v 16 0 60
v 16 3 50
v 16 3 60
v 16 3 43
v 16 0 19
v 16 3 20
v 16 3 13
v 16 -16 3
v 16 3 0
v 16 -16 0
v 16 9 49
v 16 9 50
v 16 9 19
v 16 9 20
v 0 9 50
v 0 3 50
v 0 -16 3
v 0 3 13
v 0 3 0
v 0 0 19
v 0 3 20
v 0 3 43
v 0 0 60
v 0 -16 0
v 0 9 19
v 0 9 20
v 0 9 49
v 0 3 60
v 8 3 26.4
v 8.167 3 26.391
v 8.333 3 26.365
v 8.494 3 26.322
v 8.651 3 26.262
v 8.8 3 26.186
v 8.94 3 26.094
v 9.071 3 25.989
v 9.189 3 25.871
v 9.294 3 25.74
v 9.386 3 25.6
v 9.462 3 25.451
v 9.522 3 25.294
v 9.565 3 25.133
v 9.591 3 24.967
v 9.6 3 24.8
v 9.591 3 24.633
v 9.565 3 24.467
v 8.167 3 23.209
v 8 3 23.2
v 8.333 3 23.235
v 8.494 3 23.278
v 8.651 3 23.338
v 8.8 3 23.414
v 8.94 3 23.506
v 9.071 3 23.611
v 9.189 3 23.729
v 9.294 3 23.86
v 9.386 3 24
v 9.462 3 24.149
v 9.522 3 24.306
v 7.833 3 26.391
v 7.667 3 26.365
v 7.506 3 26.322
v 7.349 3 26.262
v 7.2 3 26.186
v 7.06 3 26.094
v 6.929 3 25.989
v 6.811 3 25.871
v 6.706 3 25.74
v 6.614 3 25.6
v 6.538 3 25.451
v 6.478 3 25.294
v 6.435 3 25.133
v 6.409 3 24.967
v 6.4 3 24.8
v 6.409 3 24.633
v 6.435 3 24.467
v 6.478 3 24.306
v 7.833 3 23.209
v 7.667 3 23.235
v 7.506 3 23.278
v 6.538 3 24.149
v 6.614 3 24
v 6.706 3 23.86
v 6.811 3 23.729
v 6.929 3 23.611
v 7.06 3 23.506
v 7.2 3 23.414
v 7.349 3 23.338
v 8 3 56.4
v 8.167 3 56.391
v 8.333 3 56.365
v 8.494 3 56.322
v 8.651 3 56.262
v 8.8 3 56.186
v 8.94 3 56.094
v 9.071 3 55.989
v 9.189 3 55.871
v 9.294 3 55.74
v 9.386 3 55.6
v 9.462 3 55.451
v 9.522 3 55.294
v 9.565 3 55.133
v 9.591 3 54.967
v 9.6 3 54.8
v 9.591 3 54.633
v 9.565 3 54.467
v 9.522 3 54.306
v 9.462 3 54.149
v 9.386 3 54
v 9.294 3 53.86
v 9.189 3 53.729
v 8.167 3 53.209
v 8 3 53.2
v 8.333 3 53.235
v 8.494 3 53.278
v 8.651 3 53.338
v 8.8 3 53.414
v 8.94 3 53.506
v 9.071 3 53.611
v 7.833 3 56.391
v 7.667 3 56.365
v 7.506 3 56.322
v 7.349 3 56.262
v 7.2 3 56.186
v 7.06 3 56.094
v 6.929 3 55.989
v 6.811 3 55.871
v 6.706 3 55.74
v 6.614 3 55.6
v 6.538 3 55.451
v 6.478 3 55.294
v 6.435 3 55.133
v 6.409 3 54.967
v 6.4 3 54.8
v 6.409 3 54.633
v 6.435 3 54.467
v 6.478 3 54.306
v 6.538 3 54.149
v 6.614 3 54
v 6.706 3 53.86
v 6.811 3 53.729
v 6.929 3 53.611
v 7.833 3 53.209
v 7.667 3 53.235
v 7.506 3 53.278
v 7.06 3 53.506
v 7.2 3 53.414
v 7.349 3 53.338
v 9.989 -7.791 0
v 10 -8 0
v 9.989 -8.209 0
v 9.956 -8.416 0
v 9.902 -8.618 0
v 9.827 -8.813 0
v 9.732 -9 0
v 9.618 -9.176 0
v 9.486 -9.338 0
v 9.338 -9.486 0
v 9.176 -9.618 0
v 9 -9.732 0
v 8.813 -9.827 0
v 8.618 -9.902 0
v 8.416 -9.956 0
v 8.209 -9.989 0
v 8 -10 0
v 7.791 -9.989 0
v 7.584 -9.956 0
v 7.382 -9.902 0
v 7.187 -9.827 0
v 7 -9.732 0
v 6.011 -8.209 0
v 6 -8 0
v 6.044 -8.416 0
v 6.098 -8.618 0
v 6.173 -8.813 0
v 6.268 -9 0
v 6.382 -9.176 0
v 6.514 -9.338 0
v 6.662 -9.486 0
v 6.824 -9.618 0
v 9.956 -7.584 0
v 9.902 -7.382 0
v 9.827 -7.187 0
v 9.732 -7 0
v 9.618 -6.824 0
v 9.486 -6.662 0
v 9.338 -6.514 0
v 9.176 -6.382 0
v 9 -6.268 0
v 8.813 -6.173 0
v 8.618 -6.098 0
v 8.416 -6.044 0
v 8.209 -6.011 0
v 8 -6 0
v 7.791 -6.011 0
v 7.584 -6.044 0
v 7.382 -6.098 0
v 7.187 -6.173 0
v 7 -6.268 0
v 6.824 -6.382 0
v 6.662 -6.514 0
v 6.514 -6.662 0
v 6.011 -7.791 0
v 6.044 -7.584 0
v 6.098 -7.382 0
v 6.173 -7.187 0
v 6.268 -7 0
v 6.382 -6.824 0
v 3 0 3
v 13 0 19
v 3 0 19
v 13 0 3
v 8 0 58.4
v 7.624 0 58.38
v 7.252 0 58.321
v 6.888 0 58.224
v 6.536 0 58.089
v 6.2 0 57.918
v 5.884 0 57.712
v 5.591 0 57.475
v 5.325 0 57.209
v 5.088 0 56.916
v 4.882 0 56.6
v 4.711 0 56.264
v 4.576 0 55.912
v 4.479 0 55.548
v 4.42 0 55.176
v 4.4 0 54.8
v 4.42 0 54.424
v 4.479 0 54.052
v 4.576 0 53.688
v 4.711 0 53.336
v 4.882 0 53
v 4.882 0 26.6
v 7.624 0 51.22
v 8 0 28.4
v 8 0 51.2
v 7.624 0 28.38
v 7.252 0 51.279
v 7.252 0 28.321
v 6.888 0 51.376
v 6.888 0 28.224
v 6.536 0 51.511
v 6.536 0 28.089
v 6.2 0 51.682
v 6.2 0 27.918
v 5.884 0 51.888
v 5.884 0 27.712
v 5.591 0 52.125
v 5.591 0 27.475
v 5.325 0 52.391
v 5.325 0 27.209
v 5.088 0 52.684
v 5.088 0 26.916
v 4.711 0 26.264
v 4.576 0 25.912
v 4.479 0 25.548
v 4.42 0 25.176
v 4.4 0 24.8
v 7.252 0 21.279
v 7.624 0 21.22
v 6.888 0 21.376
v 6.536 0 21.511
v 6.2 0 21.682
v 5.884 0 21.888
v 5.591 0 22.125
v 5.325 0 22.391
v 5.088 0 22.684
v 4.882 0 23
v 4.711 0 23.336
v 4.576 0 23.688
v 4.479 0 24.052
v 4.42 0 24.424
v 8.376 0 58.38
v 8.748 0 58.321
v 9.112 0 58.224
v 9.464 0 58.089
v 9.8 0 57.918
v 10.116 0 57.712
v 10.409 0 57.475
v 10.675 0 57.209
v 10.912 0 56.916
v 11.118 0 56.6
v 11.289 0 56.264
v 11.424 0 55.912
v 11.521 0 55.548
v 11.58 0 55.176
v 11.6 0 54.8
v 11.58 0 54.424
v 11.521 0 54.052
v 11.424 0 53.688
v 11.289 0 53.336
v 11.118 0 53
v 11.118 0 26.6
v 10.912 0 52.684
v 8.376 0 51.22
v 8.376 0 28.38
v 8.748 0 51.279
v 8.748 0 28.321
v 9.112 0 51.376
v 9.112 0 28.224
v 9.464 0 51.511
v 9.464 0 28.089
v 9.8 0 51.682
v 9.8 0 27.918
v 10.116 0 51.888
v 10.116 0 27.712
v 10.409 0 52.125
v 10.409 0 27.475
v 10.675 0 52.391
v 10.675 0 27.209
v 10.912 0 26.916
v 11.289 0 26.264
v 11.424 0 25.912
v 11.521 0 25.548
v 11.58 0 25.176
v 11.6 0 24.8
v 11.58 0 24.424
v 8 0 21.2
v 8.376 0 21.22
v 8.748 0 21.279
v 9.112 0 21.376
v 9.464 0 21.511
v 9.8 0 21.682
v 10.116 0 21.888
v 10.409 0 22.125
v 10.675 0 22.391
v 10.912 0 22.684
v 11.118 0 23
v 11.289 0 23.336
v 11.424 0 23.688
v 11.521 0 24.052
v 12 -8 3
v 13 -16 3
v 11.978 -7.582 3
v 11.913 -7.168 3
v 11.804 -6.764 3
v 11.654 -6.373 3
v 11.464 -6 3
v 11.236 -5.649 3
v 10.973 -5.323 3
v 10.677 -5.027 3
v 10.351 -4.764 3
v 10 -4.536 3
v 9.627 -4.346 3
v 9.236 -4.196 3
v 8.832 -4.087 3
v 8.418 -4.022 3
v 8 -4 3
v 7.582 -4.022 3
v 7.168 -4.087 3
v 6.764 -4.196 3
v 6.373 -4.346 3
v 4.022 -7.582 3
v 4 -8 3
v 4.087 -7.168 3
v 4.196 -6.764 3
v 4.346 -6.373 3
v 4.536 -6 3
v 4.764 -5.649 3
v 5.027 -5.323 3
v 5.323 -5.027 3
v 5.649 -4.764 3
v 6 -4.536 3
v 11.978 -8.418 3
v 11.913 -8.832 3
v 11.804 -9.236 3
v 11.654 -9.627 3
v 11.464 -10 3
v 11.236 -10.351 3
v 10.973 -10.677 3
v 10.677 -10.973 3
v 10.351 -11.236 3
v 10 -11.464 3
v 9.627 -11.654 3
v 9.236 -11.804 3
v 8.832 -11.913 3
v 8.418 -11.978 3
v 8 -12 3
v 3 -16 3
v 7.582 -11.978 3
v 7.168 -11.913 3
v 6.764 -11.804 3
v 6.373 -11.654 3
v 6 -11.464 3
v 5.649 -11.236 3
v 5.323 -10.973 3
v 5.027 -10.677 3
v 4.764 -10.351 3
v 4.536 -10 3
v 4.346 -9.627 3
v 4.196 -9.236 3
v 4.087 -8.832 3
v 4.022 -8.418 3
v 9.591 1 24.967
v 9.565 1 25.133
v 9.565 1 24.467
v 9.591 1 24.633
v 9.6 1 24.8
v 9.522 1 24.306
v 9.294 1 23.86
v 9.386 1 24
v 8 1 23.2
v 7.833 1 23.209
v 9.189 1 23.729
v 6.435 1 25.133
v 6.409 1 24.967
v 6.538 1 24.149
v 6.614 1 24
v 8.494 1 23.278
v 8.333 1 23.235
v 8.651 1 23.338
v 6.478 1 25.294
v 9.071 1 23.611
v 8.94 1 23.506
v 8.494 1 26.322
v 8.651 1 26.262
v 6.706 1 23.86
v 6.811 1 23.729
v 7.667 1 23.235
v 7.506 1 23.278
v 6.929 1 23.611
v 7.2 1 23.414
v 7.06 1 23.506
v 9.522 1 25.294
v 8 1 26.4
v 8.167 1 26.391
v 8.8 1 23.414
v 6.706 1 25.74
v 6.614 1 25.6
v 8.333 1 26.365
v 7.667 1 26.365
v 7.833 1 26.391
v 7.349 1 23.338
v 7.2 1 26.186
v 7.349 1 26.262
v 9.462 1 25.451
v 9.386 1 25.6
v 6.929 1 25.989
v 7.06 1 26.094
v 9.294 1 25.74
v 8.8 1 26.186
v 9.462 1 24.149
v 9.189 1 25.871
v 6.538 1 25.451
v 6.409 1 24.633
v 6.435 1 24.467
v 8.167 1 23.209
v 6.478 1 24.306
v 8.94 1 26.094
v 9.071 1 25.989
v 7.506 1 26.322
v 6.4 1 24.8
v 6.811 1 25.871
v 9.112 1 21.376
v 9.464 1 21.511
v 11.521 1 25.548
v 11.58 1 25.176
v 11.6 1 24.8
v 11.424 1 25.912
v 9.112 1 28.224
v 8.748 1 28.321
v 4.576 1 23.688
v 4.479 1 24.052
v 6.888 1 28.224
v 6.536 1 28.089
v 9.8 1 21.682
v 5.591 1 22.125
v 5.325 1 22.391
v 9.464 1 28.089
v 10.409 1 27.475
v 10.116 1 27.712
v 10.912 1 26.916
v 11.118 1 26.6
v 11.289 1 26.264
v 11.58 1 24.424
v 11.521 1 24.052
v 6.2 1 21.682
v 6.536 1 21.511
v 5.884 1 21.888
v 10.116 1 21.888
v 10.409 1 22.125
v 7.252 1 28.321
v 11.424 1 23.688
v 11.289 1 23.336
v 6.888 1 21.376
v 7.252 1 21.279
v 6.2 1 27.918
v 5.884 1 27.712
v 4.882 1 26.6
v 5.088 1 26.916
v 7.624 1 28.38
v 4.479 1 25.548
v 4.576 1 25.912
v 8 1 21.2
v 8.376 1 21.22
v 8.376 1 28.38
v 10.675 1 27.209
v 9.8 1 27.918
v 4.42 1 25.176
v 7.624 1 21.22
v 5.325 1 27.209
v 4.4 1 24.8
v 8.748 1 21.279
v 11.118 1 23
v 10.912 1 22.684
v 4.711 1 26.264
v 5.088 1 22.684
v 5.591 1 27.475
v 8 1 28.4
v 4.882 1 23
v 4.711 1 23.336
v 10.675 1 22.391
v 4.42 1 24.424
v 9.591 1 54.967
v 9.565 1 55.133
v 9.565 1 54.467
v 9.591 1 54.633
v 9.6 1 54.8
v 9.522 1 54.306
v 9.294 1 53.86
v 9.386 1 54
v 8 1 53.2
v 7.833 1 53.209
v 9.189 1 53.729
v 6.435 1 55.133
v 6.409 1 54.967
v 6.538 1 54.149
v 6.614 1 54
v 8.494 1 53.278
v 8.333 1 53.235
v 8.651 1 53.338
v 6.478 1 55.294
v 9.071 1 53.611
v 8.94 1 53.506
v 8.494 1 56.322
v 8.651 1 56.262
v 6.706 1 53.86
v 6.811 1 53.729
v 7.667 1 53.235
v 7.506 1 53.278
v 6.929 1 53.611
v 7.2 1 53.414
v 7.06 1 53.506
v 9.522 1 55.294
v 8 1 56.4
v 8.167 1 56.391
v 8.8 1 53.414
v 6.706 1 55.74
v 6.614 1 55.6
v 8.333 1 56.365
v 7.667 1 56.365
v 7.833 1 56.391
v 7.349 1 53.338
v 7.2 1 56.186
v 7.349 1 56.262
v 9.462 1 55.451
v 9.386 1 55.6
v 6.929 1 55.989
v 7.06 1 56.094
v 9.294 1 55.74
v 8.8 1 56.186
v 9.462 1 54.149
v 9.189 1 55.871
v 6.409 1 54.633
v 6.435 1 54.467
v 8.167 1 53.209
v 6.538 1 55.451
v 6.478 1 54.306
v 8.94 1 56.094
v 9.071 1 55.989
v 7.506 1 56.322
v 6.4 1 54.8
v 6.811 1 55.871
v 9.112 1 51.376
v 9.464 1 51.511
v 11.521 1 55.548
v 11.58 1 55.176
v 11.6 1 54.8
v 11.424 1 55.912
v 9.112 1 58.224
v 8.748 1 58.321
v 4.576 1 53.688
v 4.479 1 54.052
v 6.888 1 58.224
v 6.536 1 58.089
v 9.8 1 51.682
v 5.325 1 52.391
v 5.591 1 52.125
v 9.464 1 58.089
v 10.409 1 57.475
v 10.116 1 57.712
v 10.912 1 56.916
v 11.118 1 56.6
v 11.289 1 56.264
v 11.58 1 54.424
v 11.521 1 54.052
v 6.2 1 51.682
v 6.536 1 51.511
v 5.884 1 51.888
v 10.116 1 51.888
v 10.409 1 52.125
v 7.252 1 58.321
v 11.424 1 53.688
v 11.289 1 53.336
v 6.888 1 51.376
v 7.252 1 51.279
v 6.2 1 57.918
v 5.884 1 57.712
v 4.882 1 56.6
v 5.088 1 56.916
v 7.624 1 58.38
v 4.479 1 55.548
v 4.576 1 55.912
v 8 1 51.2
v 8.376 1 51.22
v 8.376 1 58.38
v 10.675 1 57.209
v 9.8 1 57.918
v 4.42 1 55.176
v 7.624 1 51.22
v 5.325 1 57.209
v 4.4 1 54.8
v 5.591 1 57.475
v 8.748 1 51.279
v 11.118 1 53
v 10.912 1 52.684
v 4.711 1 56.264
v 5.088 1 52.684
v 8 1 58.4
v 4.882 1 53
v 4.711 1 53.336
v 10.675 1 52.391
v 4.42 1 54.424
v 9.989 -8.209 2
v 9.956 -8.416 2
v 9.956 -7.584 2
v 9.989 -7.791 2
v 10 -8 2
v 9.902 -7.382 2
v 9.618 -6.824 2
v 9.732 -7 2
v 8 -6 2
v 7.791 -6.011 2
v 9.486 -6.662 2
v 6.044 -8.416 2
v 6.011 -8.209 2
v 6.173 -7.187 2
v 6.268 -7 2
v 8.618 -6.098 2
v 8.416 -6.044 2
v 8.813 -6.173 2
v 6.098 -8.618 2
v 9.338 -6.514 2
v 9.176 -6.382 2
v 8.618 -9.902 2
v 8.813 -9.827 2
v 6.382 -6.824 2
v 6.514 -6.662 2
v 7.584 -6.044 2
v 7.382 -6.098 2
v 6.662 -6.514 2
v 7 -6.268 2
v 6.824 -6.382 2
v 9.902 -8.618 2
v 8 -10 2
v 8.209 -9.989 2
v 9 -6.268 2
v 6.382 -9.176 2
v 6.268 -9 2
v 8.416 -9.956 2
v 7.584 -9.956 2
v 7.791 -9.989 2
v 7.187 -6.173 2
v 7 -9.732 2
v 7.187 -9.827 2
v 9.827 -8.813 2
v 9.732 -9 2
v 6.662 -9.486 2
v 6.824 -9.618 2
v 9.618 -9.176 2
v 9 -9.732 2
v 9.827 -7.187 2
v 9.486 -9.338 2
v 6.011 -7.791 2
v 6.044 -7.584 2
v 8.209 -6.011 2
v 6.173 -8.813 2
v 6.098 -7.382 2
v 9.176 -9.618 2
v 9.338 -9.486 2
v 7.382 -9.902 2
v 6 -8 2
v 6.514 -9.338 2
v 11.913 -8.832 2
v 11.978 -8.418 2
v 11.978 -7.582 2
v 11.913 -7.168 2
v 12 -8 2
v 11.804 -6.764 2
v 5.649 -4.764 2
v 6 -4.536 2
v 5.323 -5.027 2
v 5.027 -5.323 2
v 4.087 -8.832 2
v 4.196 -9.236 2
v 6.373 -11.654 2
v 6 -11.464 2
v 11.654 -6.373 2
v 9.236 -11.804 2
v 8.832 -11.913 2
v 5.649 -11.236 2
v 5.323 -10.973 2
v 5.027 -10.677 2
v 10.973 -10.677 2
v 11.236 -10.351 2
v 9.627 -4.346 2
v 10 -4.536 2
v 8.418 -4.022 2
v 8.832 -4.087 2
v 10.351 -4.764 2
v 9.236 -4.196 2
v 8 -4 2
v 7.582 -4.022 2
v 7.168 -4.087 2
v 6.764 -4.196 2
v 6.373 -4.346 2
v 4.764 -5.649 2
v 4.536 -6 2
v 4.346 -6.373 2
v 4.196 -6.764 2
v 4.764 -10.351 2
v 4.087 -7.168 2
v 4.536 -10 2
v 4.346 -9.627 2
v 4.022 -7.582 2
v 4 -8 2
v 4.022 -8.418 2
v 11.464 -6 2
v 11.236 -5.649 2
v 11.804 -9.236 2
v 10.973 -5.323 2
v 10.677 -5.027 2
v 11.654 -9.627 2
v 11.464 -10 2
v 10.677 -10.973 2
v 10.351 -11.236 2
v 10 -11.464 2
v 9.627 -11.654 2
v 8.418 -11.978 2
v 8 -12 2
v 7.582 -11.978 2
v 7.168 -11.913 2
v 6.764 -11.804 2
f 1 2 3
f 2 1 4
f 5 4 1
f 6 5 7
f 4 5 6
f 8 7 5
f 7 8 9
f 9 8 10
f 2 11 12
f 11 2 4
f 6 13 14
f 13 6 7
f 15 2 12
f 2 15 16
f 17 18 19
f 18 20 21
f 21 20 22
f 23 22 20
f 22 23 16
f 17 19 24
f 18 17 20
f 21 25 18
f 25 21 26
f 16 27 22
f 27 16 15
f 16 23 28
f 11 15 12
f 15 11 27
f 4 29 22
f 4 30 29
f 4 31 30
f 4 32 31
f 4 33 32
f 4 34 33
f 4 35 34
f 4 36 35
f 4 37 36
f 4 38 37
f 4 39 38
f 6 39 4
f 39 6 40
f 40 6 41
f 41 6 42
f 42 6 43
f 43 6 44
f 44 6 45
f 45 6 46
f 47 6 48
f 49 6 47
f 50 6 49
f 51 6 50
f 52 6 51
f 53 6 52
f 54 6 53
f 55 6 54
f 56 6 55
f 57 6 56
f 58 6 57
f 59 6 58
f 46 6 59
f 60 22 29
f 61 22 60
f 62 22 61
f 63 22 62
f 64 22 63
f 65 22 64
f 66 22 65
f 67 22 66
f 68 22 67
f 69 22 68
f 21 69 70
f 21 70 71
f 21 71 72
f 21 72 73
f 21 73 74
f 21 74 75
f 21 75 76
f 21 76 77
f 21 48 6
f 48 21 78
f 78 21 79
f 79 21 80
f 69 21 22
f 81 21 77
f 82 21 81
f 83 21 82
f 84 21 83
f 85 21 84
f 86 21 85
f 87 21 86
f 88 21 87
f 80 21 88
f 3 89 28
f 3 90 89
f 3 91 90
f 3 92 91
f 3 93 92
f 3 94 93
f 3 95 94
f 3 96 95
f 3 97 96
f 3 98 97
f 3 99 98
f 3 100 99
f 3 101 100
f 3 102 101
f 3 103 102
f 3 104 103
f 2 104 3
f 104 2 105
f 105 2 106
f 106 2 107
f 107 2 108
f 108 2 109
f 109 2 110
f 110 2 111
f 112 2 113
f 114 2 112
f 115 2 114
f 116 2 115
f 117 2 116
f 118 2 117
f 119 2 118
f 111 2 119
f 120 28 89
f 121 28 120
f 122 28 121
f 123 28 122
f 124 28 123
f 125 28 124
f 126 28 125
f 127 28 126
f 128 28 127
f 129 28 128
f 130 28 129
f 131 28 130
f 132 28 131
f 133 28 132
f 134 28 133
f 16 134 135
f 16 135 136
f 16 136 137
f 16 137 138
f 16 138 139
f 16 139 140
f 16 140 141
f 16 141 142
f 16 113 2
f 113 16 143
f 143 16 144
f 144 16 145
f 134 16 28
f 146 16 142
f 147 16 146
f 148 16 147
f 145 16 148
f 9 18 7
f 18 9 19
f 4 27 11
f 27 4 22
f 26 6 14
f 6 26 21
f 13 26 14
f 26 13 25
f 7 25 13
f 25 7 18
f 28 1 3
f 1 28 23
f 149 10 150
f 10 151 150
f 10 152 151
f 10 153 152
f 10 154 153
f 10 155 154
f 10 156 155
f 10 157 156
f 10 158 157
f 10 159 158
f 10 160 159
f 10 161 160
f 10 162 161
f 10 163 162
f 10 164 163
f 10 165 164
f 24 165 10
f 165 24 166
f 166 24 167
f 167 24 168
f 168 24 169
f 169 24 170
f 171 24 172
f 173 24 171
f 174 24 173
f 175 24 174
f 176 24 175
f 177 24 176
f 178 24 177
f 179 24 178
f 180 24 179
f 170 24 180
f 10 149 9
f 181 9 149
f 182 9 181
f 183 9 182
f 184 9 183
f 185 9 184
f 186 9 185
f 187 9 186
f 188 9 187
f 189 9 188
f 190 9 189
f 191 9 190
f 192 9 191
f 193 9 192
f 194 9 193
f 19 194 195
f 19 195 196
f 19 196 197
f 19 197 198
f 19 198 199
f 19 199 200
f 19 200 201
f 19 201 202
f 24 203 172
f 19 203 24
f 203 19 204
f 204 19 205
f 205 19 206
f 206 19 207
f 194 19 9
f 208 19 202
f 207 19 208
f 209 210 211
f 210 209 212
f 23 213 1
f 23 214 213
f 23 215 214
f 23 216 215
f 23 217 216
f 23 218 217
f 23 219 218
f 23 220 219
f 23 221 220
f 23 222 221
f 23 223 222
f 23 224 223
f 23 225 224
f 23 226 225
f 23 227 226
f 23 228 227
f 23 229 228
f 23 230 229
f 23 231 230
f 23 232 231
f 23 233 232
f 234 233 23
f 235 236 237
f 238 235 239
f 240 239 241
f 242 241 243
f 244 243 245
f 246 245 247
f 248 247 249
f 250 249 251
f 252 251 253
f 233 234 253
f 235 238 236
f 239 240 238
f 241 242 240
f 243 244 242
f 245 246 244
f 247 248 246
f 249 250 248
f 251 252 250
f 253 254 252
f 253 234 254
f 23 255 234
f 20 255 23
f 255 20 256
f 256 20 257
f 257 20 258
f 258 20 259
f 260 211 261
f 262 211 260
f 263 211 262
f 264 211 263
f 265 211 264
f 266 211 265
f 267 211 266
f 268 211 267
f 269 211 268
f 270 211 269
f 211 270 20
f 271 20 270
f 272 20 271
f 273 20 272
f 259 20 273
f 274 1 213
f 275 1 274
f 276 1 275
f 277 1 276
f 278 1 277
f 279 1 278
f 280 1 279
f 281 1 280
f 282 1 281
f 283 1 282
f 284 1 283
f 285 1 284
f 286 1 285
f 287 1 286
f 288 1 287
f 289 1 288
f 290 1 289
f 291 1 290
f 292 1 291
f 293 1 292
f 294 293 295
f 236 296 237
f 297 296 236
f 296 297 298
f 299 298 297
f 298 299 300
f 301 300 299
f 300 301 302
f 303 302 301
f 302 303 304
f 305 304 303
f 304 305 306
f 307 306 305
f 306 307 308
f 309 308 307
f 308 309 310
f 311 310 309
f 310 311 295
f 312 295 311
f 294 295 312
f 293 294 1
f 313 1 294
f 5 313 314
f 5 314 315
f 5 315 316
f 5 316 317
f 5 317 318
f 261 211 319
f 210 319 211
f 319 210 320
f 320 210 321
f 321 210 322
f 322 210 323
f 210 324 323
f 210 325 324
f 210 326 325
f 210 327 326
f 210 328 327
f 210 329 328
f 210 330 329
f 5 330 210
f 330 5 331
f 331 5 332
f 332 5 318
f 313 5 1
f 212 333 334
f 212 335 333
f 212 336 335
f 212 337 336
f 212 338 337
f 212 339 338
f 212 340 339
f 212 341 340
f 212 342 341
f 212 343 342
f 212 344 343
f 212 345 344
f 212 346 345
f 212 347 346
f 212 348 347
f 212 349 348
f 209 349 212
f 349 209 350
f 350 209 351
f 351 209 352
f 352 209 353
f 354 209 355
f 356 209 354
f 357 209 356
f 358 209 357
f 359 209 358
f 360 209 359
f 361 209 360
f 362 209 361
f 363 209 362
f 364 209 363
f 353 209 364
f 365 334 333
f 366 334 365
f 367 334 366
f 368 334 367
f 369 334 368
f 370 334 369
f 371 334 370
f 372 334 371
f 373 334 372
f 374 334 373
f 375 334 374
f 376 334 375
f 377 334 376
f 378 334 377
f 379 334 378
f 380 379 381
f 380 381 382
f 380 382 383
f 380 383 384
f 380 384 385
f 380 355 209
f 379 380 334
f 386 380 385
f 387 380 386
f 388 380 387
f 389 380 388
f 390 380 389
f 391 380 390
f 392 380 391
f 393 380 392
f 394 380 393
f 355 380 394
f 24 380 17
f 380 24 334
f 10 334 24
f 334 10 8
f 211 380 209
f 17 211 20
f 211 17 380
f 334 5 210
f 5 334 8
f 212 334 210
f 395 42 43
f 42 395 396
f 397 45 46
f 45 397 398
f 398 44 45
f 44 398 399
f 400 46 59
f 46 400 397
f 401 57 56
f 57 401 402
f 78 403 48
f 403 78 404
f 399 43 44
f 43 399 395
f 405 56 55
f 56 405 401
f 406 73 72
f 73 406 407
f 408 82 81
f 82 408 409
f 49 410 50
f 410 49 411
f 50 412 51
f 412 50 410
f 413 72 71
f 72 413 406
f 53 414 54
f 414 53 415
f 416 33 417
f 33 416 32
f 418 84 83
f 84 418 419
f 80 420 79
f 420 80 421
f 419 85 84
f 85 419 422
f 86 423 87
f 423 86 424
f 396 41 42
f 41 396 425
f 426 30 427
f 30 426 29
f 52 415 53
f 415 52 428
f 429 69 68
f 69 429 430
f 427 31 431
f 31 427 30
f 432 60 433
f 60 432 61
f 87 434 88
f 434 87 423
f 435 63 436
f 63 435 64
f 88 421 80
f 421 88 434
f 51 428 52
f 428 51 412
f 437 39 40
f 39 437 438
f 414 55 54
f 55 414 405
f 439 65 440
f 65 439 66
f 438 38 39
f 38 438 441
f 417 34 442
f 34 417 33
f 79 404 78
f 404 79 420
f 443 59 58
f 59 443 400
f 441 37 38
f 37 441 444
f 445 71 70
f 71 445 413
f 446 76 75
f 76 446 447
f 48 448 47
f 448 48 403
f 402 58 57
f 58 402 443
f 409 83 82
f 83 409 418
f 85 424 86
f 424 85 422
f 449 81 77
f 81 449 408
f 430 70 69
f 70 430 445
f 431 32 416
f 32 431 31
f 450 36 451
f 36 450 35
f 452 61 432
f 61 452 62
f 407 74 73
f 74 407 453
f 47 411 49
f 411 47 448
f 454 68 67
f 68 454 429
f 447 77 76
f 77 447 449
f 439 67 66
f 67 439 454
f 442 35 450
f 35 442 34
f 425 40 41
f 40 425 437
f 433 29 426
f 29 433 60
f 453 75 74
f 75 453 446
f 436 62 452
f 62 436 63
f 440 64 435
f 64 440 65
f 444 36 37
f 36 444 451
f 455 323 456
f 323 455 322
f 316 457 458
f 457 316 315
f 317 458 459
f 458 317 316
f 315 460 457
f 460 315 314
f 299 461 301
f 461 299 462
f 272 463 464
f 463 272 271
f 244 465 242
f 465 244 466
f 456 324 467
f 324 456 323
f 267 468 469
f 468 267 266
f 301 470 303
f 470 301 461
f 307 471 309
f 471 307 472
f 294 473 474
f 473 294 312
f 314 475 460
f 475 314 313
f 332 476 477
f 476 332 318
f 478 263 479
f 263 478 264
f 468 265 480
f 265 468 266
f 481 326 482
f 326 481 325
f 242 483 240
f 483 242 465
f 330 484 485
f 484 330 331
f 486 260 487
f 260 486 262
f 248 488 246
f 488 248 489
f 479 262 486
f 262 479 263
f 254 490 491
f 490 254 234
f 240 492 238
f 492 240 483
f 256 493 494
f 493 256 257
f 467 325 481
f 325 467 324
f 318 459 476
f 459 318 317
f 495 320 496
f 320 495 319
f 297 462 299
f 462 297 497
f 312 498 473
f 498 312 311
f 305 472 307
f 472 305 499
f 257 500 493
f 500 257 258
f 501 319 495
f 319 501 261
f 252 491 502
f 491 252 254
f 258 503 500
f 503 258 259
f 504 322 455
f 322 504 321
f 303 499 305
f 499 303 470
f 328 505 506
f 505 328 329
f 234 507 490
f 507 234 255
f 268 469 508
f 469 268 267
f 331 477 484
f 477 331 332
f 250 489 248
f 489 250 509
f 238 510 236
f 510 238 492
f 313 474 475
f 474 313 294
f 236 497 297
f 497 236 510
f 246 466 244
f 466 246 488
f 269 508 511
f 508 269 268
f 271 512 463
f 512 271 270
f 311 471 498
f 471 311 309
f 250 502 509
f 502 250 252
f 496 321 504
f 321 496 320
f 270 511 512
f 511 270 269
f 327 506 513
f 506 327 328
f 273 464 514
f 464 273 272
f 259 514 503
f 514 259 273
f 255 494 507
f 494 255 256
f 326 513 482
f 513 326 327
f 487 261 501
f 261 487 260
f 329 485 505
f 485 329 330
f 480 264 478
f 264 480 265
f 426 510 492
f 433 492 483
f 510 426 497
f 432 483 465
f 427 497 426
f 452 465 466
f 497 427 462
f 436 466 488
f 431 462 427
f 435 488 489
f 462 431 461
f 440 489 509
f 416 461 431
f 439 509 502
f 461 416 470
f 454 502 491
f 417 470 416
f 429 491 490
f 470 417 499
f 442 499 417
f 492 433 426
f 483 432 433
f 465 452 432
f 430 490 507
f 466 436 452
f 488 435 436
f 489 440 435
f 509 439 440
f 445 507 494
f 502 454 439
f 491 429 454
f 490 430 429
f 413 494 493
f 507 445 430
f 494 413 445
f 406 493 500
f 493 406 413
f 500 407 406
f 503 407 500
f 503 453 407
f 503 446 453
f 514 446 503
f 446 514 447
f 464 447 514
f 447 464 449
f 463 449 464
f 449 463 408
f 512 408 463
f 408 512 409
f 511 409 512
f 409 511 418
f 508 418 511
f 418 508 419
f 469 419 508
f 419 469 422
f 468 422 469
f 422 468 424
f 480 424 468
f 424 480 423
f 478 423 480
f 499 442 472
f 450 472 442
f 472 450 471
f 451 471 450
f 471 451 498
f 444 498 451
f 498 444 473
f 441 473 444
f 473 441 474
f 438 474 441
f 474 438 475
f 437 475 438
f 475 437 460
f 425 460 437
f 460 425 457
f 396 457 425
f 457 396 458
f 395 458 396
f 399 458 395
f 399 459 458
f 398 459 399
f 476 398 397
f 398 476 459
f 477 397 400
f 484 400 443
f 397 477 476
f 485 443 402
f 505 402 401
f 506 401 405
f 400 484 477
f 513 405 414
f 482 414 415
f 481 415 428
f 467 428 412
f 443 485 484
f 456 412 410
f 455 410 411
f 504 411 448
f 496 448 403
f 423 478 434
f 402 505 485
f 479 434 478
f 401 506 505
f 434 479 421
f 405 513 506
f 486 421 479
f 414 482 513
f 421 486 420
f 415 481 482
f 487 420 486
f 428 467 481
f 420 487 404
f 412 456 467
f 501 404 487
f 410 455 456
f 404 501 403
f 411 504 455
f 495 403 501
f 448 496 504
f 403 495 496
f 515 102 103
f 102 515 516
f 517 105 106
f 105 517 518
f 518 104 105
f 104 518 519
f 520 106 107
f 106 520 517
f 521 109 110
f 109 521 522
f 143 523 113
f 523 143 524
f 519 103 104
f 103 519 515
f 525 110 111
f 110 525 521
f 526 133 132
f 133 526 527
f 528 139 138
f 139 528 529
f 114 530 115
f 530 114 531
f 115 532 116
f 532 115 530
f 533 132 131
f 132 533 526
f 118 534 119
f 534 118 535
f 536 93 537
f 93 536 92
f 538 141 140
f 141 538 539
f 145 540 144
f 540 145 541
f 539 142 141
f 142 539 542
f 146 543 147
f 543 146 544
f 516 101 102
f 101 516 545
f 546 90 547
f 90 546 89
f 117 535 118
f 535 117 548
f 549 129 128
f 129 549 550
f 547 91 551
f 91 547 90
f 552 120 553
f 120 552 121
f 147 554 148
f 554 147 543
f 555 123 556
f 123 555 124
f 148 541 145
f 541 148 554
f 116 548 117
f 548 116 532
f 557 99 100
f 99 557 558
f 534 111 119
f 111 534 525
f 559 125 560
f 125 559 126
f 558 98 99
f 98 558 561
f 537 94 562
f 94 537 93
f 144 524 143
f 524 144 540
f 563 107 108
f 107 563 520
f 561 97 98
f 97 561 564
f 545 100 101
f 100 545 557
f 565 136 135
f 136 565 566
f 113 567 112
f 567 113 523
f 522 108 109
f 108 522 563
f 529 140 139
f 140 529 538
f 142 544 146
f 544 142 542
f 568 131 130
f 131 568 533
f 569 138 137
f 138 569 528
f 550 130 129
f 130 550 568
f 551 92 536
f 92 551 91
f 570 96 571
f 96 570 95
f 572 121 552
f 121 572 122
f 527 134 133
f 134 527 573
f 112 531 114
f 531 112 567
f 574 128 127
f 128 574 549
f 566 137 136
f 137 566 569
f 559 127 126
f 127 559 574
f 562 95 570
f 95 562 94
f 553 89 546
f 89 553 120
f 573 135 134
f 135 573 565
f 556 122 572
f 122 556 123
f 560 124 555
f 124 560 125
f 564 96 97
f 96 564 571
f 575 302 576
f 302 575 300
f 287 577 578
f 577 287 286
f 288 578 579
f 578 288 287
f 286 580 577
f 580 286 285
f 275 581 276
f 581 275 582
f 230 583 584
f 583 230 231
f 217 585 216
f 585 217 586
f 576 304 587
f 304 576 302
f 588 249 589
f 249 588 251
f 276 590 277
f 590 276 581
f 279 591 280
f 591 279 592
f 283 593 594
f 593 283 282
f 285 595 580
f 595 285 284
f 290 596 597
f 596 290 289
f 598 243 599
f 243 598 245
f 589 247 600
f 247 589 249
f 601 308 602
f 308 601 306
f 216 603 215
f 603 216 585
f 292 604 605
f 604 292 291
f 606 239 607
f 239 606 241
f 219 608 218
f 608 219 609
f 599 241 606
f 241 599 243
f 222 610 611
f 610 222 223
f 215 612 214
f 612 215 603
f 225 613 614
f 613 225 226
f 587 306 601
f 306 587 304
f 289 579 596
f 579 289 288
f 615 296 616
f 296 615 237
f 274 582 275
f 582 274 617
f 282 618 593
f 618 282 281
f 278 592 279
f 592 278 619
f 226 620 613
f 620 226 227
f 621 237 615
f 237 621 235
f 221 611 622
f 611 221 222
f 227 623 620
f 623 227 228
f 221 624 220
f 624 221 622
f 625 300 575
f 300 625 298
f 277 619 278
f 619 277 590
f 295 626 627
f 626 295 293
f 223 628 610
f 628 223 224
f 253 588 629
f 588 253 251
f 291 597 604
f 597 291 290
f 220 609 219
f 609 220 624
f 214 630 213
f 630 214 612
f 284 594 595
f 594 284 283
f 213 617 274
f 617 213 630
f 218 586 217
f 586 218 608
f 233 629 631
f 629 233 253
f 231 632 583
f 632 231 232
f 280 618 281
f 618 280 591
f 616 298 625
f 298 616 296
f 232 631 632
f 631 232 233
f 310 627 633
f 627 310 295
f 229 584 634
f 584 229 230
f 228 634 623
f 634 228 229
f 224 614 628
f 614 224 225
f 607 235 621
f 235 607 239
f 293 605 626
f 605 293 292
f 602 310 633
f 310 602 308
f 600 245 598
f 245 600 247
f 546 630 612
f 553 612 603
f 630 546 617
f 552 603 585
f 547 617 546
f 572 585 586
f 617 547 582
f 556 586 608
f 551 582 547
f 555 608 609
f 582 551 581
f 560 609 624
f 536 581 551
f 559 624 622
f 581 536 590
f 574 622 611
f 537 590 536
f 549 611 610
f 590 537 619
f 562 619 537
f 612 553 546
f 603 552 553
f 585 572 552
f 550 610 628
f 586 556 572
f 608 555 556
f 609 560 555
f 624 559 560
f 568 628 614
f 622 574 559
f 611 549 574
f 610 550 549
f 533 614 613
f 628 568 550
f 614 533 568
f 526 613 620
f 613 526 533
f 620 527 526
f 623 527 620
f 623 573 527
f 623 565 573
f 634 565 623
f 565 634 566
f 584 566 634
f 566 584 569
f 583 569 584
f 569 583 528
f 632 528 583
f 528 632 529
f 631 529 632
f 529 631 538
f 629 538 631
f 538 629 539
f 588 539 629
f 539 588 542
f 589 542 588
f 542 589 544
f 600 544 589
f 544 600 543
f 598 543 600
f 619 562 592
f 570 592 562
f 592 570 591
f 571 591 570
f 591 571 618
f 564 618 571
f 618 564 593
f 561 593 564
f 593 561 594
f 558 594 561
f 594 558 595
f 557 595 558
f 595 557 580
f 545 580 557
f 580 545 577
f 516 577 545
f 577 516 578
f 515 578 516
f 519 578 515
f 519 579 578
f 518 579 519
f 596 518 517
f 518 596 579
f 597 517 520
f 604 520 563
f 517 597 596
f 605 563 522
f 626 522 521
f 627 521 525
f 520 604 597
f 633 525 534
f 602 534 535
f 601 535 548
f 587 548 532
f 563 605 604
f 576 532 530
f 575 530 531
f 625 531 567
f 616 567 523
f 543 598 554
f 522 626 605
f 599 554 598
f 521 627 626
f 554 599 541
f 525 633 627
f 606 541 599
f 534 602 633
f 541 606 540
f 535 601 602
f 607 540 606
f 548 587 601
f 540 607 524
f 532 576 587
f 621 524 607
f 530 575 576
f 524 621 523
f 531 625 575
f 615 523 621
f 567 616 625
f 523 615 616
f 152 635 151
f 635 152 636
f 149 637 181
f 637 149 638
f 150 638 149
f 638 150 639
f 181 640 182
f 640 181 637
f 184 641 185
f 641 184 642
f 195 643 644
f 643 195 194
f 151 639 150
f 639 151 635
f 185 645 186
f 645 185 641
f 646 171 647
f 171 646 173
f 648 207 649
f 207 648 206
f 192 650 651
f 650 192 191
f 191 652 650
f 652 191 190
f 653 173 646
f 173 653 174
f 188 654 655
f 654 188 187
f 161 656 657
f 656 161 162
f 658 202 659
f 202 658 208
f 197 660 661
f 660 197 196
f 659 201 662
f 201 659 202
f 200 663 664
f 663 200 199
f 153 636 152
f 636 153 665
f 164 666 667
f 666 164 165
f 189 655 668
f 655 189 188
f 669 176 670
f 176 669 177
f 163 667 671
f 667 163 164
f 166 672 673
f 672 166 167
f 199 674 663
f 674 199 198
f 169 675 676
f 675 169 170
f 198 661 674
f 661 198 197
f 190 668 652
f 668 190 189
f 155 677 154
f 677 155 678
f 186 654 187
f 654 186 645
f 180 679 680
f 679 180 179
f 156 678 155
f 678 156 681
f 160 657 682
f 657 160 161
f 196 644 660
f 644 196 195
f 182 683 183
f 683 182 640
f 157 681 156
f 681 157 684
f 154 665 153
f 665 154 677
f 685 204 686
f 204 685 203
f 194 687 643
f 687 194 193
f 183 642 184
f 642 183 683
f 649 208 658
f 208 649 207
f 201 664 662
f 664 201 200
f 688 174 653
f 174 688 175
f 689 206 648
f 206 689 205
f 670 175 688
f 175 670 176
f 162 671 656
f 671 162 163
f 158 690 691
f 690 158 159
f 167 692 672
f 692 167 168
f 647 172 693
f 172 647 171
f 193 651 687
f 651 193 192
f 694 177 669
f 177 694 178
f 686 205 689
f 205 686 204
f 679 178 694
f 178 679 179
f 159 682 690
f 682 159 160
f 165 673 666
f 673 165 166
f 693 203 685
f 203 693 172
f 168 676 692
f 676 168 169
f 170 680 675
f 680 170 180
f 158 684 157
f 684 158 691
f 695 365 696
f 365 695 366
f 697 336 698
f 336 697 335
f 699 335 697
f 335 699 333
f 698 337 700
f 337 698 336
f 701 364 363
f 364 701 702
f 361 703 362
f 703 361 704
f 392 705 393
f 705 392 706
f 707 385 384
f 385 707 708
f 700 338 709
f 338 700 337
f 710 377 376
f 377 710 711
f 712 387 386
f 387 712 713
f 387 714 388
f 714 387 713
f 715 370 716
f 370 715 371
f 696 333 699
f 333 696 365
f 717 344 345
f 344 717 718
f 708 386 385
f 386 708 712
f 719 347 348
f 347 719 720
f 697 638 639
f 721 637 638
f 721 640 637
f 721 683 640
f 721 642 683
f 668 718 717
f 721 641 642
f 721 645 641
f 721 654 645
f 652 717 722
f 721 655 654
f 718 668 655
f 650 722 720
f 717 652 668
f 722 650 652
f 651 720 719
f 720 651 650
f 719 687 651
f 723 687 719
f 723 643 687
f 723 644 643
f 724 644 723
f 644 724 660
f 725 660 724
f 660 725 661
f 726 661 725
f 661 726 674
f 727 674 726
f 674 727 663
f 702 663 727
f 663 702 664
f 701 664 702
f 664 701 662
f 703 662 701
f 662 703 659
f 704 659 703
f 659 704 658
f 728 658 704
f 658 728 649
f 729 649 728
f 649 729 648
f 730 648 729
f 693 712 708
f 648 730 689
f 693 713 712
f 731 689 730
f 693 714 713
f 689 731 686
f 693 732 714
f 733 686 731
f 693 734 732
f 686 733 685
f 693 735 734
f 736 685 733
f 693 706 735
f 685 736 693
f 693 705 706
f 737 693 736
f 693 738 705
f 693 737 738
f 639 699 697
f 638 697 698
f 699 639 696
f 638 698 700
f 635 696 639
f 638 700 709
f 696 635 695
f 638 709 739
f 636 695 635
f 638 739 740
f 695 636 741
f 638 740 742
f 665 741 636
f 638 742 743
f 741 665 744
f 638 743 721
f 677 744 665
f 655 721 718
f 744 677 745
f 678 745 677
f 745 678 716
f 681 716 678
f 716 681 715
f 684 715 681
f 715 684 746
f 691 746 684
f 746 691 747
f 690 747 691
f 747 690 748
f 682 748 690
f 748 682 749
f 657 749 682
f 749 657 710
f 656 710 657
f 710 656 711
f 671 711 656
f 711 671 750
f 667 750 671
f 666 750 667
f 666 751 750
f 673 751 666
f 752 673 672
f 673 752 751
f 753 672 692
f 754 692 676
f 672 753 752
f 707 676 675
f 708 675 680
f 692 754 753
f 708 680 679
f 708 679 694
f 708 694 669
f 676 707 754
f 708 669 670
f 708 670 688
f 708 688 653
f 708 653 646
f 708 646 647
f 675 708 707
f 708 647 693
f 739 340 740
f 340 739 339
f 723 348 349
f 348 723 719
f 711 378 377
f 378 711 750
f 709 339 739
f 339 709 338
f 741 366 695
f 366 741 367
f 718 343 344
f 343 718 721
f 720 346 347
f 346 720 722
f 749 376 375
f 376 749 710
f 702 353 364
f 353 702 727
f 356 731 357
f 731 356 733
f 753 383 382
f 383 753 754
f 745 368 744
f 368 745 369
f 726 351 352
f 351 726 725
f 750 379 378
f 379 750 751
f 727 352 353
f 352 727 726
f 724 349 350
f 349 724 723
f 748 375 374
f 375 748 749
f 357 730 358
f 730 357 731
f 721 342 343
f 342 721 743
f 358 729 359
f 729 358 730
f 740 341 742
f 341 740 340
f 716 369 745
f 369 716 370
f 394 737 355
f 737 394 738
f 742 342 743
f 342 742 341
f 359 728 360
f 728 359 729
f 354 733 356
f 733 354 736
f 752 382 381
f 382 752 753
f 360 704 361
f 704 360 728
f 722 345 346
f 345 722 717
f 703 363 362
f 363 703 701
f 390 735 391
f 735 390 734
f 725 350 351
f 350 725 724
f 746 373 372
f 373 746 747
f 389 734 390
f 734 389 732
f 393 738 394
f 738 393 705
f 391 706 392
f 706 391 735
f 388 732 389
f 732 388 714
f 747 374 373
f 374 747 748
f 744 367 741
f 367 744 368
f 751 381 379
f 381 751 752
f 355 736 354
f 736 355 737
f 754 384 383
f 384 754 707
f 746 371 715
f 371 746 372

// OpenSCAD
// 3D-printed 3.5" drive mount posts

// Idea is to print 4 of these; they hold two drives
// securely, allow front access (e.g., for inserting
// media), and can be screwed down. M3 screws are
// assumed for securing the drives. 6-32 screws are
// assumed for screwing the posts to whatever surface
// the posts are attached to.

$fn = 60;

// ----------------------------------------------------------------------
// design parameters (all units are mm)
// ----------------------------------------------------------------------

// main post dimensions
post_h = 60;
post_w = 16;
post_d = 3;

// how deep the foot extends back from the "front" of the post
foot_d = post_w;

brace_side_len = foot_d;

// how far below center of drive screw hole the top surface
// of the support ledge should be
ledge_offset_h = 4.8;

// ledge depth
ledge_d = 6;

// thickness of ledge above the bevel (so there isn't a sharp edge)
ledge_h = 1;

// drive placement
drive_clearance_h = 20; // how far above the surface the bottom drive is placed
drive_separation_h = 30; // separation, bottom of bottom drive to bottom of top drive

bottom_drive_h = drive_clearance_h;
top_drive_h = bottom_drive_h + drive_separation_h;

// M3 screw hole diameter
m3_hole_diameter = 3.2;

// 6-32 screw hole diameter (these are a bit larger than M3)
n6_hole_diameter = 4;

// "countersink" diameter and depth (so that screw holes are recessed slightly)
m3_countersink_diameter = 7.2;
n6_countersink_diameter = 8;
countersink_d = 1;

// ----------------------------------------------------------------------
// component modules
// ----------------------------------------------------------------------

// triangular brace to help keep the post rigid with respect to the foot
module foot_brace() {
    translate([post_d, brace_side_len, 0]) {
        rotate([90, 0, 270]) {
            linear_extrude(post_d) {
                polygon([[0, 0], [brace_side_len, 0], [0, brace_side_len]]);
            }
        }
    }
}

// trangular "bevel" below the drive ledge
module ledge_bevel() {
    rotate([90, 90, 90]) {
        linear_extrude(post_w) {
            polygon([[0, 0], [ledge_d, 0], [0, ledge_d]]);
        }
    }
}

// drive "ledge"; z reference is the surface that the
// drive sits on
module ledge() {
    translate([0, 0, -ledge_h]) {
        cube([post_w, ledge_d, ledge_h]);
        ledge_bevel();
    }
}

// body of post: defines the solid shapes, but doesn't
// have the screw holes
module post_body() {
    // main post
    cube([post_w, post_d, post_h]);
    
    // foot
    translate([0, -foot_d, 0]) {
        cube([post_w, foot_d, post_d]);
    }
    
    // diagonal bracing for foot
    translate([0, -brace_side_len, post_d]) {
        foot_brace();
    }
    translate([post_w - post_d, -brace_side_len, post_d]) {
        foot_brace();
    }

    // ledge for bottom drive
    translate([0, post_d, top_drive_h]) {
        ledge();
    }

    // ledge for top drive
    translate([0, post_d, bottom_drive_h]) {
        ledge();
    }
}

// Cylinder to be subtracted to create a screw hole for a drive.
// Reference is center of hole in the x/z plane. The cylinder extends
// 10mm in both directions, so it should be able to "punch through"
// the solid post as needed.
module drive_screw_hole() {
    translate([0, -10, 0]) {
        rotate([-90, 0, 0]) {
            cylinder(h=20, d=m3_hole_diameter);
        }
    }
}

// cylinder for the foot screw hole
module foot_screw_hole() {
    translate([0, 0, -10]) {
        cylinder(h=20, d=n6_hole_diameter);
    }
}

// countersink cylinder for punching into a vertical surface
// (i.e., the drive post)
module countersink(diameter) {
    translate([0, countersink_d, 0]) {
        rotate([90, 0, 0]) {
            cylinder(h=5, d=diameter);
        }
    }
}

// countersink cylinder for punching into a horizontal surface
// (i.e., the foot)
module countersink_horiz(diameter) {
    translate([0, 0, post_d]) {
        rotate([-90, 0, 0]) {
            countersink(diameter);
        }
    }
}

// ----------------------------------------------------------------------
// complete drive post module
// ----------------------------------------------------------------------


// post with screw holes and countersinks
module post() {
    difference() {
        post_body();

        // screw hole for bottom drive
        translate([post_w/2, 0, bottom_drive_h + ledge_offset_h]) {
            drive_screw_hole();
            countersink(m3_countersink_diameter);
        }

        // screw hole for top drive
        translate([post_w/2, 0, top_drive_h + ledge_offset_h]) {
            drive_screw_hole();
            countersink(m3_countersink_diameter);
        }

        // screw hole for foot
        translate([foot_d/2, -foot_d/2, 0]) {
            foot_screw_hole();
            countersink_horiz(n6_countersink_diameter);
        }
    }
}

// can uncomment these for testing...
//post_body();
//foot_brace();
//ledge();
//ledge_bevel();
//drive_screw_hole();
//countersink();
//countersink_horiz();
//foot_screw_hole();

// generate the post
post();
